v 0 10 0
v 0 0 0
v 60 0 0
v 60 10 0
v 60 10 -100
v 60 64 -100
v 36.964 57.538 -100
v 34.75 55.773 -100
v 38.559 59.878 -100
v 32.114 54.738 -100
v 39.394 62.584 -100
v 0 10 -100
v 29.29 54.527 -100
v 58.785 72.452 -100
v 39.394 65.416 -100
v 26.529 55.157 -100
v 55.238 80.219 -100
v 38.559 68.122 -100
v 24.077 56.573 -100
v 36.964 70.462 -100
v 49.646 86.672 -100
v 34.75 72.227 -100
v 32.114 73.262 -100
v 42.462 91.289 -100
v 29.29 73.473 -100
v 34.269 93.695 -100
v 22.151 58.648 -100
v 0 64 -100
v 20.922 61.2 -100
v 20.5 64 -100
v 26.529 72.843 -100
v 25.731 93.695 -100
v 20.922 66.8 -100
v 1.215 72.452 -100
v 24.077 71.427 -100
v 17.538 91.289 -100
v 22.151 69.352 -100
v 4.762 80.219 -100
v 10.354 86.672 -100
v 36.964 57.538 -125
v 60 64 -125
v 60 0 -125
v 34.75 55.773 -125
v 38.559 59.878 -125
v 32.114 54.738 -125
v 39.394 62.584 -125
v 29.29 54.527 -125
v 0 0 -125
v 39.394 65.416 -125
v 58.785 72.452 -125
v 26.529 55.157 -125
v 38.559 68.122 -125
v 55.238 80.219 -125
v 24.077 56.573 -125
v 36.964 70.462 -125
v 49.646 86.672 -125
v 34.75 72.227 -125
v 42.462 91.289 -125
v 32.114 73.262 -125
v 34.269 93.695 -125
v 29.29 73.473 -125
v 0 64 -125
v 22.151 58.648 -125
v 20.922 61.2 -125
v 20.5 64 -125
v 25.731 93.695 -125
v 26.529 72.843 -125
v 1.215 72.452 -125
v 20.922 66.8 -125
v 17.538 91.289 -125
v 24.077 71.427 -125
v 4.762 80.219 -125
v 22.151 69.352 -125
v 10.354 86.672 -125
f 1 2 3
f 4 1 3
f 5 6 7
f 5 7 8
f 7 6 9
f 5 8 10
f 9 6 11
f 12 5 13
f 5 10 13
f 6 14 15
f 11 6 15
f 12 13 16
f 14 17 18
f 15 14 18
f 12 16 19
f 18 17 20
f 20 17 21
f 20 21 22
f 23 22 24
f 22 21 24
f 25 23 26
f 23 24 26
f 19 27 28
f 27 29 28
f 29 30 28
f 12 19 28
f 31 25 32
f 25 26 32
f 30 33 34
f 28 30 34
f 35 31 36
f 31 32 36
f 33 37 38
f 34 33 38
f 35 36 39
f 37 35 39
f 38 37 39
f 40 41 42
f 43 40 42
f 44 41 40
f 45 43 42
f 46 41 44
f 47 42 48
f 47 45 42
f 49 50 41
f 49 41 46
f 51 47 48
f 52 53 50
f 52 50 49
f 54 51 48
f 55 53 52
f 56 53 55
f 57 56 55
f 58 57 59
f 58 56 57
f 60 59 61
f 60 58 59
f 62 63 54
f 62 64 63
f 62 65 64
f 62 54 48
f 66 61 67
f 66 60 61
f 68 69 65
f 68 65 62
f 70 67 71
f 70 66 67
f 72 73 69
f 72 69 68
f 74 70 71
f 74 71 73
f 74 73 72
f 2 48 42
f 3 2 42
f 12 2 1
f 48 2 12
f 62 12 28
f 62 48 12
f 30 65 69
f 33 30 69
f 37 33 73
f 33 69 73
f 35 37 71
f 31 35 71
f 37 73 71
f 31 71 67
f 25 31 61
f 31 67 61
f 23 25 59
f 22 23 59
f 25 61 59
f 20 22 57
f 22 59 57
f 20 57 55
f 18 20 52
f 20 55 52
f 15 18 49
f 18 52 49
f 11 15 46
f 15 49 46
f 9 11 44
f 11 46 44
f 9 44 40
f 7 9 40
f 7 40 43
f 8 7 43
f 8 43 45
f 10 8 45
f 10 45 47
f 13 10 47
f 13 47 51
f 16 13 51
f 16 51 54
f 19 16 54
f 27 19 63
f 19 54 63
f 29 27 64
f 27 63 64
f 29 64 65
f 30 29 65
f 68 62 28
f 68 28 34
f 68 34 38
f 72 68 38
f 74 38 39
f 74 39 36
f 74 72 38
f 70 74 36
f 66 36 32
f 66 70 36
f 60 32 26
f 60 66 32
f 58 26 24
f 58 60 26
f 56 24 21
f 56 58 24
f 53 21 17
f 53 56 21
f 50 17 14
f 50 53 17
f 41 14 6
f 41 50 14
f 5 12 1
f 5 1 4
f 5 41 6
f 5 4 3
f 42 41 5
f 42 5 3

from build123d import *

# Parameters (mm, degrees)
SKETCH1_W           = 60
SKETCH1_H           = 125
BOSS_EXTRUDE1_DEPTH = 10
SKETCH2_R           = 9.5
BOSS_EXTRUDE2_DEPTH = 25


with BuildPart() as part:
    # Sketch1 → Boss-Extrude1 (new body)
    with BuildSketch(Plane(origin=(0, 0, 0), x_dir=(1, 0, 0), z_dir=(0, 1, 0))):
        with Locations((30, 62.5)):
            Rectangle(SKETCH1_W, SKETCH1_H)
    extrude(amount=BOSS_EXTRUDE1_DEPTH)

    # Sketch2 → Boss-Extrude2 (add)
    with BuildSketch(Plane(origin=(0, 0, -125), x_dir=(-1, 0, 0), z_dir=(0, 0, -1))):
        with BuildLine():
            Line((-60, 10), (0, 10))
            Line((0, 10), (0, 64))
            ThreePointArc((0, 64), (-30, 94), (-60, 64))
            Line((-60, 64), (-60, 10))
        make_face()
        with Locations((-30, 64)):
            Circle(SKETCH2_R, mode=Mode.SUBTRACT)
    extrude(amount=-BOSS_EXTRUDE2_DEPTH)


solid = part.part
